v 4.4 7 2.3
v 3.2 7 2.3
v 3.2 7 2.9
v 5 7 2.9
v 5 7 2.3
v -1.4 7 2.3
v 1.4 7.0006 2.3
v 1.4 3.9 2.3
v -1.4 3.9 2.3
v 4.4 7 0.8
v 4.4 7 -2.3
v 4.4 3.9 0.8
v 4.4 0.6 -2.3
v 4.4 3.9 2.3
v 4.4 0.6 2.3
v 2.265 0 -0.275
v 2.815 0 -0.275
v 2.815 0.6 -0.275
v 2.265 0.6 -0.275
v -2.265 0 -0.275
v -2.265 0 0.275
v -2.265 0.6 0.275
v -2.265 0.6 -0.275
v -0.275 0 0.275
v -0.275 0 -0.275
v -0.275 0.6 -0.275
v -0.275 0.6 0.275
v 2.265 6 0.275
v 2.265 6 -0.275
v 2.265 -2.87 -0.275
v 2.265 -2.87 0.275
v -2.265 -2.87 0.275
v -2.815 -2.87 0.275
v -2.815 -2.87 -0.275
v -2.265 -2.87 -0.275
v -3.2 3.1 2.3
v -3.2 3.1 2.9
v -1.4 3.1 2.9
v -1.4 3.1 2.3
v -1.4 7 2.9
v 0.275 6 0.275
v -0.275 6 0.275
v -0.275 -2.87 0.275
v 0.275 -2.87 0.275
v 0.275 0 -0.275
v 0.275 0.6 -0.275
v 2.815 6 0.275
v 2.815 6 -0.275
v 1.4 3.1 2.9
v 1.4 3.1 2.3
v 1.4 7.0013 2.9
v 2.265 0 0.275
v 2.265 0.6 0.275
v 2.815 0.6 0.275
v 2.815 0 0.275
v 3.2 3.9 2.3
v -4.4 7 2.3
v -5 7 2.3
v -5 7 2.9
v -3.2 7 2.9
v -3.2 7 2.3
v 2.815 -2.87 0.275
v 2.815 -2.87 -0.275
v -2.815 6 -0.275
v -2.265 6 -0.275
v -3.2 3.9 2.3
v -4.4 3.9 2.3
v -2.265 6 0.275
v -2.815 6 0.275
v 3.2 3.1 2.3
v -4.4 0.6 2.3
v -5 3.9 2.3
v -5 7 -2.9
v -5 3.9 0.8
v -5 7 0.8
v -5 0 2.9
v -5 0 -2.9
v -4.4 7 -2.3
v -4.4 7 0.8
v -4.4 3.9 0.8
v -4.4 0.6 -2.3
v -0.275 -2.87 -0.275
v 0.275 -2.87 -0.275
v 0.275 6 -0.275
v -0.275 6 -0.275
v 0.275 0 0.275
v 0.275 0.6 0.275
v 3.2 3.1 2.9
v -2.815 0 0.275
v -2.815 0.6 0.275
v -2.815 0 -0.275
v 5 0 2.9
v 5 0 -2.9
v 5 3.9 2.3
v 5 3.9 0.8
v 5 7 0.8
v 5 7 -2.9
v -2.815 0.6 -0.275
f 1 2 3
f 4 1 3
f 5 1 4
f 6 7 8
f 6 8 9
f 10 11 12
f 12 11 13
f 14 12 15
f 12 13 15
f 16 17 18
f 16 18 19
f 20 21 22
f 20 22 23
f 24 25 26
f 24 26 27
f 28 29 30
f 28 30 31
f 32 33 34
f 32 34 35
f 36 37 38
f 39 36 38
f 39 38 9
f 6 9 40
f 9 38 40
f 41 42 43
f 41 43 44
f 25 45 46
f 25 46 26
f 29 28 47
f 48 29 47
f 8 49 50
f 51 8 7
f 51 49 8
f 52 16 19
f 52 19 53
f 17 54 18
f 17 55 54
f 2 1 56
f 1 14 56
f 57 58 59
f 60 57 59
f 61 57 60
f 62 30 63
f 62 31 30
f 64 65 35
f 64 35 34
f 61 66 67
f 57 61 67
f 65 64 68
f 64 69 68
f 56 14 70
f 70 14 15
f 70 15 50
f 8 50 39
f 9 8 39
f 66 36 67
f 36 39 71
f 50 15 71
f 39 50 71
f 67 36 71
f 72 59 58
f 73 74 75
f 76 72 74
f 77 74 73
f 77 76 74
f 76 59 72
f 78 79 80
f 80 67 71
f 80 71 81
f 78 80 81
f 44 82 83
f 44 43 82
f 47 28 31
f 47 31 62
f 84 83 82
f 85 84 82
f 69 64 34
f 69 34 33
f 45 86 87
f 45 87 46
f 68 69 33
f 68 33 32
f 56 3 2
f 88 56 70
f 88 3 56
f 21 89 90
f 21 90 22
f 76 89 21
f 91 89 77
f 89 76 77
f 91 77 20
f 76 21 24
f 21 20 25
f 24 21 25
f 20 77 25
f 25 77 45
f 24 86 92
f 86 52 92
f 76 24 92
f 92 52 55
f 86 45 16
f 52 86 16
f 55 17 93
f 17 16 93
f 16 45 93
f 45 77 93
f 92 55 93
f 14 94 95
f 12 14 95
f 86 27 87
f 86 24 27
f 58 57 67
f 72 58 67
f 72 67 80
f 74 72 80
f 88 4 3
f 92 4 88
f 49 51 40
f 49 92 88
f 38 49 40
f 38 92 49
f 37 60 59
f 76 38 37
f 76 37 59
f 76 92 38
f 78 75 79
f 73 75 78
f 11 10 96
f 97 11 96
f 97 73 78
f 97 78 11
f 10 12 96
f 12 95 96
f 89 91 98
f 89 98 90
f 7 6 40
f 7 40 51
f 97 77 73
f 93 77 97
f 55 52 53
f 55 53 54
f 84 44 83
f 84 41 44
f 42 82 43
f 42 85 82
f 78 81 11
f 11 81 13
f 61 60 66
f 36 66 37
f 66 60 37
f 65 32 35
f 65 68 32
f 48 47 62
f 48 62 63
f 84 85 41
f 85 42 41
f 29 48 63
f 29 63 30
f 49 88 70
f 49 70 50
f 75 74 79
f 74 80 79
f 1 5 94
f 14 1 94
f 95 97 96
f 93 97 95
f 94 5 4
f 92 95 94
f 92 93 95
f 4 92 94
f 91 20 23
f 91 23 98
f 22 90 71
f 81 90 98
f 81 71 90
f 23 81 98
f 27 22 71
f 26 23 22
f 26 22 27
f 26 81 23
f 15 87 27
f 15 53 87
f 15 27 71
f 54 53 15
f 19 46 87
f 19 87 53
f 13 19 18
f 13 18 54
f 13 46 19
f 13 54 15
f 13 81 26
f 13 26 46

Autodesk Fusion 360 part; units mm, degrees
sketch "Sketch1" plane through (0, 0, 0) normal (0, 1, 0) x (1, 0, 0)
  line L0 (5, -2.9) -> (-5, -2.9)
  line L1 (-5, -2.9) -> (-5, 2.9)
  line L2 (-5, 2.9) -> (5, 2.9)
  line L3 (5, 2.9) -> (5, -2.9)
  line L4 (5, -2.9) -> (-5, 2.9) construction
  line L5 (-5, -2.9) -> (5, 2.9) construction
  line L6 (4.4, -2.3) -> (-4.4, -2.3)
  line L7 (-4.4, -2.3) -> (-4.4, 2.3)
  line L8 (-4.4, 2.3) -> (4.4, 2.3)
  line L9 (4.4, 2.3) -> (4.4, -2.3)
  dimension "d1" = 10
  dimension "d2" = 5.8
  dimension "d3" = 0.6
extrude "Extrude1" add sketch "Sketch1" along normal blind 0.6 contours L6 L7 L8 L9 makes body 1
extrude "Extrude2" add sketch "Sketch1" along normal blind 7 bodies 1
sketch "Sketch2" plane through (0, 0, 2.9) normal (0, 0, 1) x (1, 0, 0)
  line L0 (-5, 0) -> (5, 0)
  line L1 (5, 0) -> (5, 7)
  line L2 (5, 7) -> (-5, 7)
  line L3 (-5, 7) -> (-5, 0)
  line L4 (5, 7) -> (3.2, 7) construction
  line L5 (-5, 7) -> (-3.2, 7) construction
  line L6 (-3.2, 7) -> (-3.2, 3.1)
  line L7 (-3.2, 3.1) -> (-1.4, 3.1)
  line L8 (-1.4, 3.1) -> (-1.4, 7)
  line L9 (-1.4, 3.1) -> (5, 3.1) construction
  line L10 (3.2, 7) -> (3.2, 3.1)
  line L11 (3.2, 3.1) -> (1.4, 3.1)
  line L12 (1.4, 3.1) -> (1.4, 7.0013)
  dimension "d8" = 1.8
  dimension "d9" = 1.8
  dimension "d10" = 3.9
  dimension "d11" = 1.8
  dimension "d12" = 90
  dimension "d13" = 1.8
  dimension "d14" = 90
extrude "Extrude3" cut sketch "Sketch2" against normal blind 1 contours L2 L6 L7 L8 | L2 L10 L11 L12 bodies 1
sketch "Sketch3" plane through (5, 0, 0) normal (1, 0, 0) x (0, 0, -1)
  line L0 (-2.9, 0) -> (2.9, 0)
  line L1 (2.9, 0) -> (2.9, 7)
  line L2 (2.9, 7) -> (-2.9, 7)
  line L3 (-2.9, 7) -> (-2.9, 0)
  line L4 (-2.3, 7) -> (-2.3, 3.9)
  line L5 (-2.3, 3.9) -> (-0.8, 3.9)
  line L6 (-0.8, 3.9) -> (-0.8, 7)
  point P0 (-2.3, 7)
  dimension "d17" = 3.1
  dimension "d18" = 1.5
  dimension "d19" = 90
extrude "Extrude4" cut sketch "Sketch3" against normal blind 13.5 contours L2 L4 L5 L6 bodies 1
sketch "Sketch4" plane through (0, 0, 0) normal (0, -1, 0) x (1, 0, 0)
  line L0 (-5, -2.9) -> (5, -2.9)
  line L1 (5, -2.9) -> (5, 2.9)
  line L2 (5, 2.9) -> (-5, 2.9)
  line L3 (-5, 2.9) -> (-5, -2.9)
  line L4 (0.275, -0.275) -> (-0.275, -0.275)
  line L5 (-0.275, -0.275) -> (-0.275, 0.275)
  line L6 (-0.275, 0.275) -> (0.275, 0.275)
  line L7 (0.275, 0.275) -> (0.275, -0.275)
  line L8 (0.275, -0.275) -> (-0.275, 0.275) construction
  line L9 (-0.275, -0.275) -> (0.275, 0.275) construction
  line L10 (0, 0) -> (2.54, 0) construction
  line L11 (0, 0) -> (-2.54, 0) construction
  line L12 (-2.265, -0.275) -> (-2.815, -0.275)
  line L13 (-2.815, -0.275) -> (-2.815, 0.275)
  line L14 (-2.815, 0.275) -> (-2.265, 0.275)
  line L15 (-2.265, 0.275) -> (-2.265, -0.275)
  line L16 (-2.265, -0.275) -> (-2.815, 0.275) construction
  line L17 (-2.815, -0.275) -> (-2.265, 0.275) construction
  line L18 (2.815, -0.275) -> (2.265, -0.275)
  line L19 (2.265, -0.275) -> (2.265, 0.275)
  line L20 (2.265, 0.275) -> (2.815, 0.275)
  line L21 (2.815, 0.275) -> (2.815, -0.275)
  line L22 (2.815, -0.275) -> (2.265, 0.275) construction
  line L23 (2.265, -0.275) -> (2.815, 0.275) construction
  point P0 (-2.54, 0)
  point P1 (2.54, 0)
  dimension "d22" = 0.55
  dimension "d23" = 0.55
  dimension "d24" = 2.54
  dimension "d25" = 2.54
  dimension "d26" = 0.55
  dimension "d27" = 0.55
  dimension "d28" = 0.55
  dimension "d29" = 0.55
extrude "Extrude5" cut sketch "Sketch4" against normal blind 1 contours L4 L5 L6 L7 | L12 L13 L14 L15 | L18 L19 L20 L21 bodies 1
extrude "Extrude6" add sketch "Sketch4" along normal blind 2.87 and the other way blind 6 separate body contours L4 L5 L6 L7 | L12 L13 L14 L15 | L18 L19 L20 L21 makes body 2 at (2.815, 0.0867, -0.0917) makes body 3 at (-0.0917, 0.0867, -0.275) makes body 4 at (-2.265, 0.0867, -0.0917)
